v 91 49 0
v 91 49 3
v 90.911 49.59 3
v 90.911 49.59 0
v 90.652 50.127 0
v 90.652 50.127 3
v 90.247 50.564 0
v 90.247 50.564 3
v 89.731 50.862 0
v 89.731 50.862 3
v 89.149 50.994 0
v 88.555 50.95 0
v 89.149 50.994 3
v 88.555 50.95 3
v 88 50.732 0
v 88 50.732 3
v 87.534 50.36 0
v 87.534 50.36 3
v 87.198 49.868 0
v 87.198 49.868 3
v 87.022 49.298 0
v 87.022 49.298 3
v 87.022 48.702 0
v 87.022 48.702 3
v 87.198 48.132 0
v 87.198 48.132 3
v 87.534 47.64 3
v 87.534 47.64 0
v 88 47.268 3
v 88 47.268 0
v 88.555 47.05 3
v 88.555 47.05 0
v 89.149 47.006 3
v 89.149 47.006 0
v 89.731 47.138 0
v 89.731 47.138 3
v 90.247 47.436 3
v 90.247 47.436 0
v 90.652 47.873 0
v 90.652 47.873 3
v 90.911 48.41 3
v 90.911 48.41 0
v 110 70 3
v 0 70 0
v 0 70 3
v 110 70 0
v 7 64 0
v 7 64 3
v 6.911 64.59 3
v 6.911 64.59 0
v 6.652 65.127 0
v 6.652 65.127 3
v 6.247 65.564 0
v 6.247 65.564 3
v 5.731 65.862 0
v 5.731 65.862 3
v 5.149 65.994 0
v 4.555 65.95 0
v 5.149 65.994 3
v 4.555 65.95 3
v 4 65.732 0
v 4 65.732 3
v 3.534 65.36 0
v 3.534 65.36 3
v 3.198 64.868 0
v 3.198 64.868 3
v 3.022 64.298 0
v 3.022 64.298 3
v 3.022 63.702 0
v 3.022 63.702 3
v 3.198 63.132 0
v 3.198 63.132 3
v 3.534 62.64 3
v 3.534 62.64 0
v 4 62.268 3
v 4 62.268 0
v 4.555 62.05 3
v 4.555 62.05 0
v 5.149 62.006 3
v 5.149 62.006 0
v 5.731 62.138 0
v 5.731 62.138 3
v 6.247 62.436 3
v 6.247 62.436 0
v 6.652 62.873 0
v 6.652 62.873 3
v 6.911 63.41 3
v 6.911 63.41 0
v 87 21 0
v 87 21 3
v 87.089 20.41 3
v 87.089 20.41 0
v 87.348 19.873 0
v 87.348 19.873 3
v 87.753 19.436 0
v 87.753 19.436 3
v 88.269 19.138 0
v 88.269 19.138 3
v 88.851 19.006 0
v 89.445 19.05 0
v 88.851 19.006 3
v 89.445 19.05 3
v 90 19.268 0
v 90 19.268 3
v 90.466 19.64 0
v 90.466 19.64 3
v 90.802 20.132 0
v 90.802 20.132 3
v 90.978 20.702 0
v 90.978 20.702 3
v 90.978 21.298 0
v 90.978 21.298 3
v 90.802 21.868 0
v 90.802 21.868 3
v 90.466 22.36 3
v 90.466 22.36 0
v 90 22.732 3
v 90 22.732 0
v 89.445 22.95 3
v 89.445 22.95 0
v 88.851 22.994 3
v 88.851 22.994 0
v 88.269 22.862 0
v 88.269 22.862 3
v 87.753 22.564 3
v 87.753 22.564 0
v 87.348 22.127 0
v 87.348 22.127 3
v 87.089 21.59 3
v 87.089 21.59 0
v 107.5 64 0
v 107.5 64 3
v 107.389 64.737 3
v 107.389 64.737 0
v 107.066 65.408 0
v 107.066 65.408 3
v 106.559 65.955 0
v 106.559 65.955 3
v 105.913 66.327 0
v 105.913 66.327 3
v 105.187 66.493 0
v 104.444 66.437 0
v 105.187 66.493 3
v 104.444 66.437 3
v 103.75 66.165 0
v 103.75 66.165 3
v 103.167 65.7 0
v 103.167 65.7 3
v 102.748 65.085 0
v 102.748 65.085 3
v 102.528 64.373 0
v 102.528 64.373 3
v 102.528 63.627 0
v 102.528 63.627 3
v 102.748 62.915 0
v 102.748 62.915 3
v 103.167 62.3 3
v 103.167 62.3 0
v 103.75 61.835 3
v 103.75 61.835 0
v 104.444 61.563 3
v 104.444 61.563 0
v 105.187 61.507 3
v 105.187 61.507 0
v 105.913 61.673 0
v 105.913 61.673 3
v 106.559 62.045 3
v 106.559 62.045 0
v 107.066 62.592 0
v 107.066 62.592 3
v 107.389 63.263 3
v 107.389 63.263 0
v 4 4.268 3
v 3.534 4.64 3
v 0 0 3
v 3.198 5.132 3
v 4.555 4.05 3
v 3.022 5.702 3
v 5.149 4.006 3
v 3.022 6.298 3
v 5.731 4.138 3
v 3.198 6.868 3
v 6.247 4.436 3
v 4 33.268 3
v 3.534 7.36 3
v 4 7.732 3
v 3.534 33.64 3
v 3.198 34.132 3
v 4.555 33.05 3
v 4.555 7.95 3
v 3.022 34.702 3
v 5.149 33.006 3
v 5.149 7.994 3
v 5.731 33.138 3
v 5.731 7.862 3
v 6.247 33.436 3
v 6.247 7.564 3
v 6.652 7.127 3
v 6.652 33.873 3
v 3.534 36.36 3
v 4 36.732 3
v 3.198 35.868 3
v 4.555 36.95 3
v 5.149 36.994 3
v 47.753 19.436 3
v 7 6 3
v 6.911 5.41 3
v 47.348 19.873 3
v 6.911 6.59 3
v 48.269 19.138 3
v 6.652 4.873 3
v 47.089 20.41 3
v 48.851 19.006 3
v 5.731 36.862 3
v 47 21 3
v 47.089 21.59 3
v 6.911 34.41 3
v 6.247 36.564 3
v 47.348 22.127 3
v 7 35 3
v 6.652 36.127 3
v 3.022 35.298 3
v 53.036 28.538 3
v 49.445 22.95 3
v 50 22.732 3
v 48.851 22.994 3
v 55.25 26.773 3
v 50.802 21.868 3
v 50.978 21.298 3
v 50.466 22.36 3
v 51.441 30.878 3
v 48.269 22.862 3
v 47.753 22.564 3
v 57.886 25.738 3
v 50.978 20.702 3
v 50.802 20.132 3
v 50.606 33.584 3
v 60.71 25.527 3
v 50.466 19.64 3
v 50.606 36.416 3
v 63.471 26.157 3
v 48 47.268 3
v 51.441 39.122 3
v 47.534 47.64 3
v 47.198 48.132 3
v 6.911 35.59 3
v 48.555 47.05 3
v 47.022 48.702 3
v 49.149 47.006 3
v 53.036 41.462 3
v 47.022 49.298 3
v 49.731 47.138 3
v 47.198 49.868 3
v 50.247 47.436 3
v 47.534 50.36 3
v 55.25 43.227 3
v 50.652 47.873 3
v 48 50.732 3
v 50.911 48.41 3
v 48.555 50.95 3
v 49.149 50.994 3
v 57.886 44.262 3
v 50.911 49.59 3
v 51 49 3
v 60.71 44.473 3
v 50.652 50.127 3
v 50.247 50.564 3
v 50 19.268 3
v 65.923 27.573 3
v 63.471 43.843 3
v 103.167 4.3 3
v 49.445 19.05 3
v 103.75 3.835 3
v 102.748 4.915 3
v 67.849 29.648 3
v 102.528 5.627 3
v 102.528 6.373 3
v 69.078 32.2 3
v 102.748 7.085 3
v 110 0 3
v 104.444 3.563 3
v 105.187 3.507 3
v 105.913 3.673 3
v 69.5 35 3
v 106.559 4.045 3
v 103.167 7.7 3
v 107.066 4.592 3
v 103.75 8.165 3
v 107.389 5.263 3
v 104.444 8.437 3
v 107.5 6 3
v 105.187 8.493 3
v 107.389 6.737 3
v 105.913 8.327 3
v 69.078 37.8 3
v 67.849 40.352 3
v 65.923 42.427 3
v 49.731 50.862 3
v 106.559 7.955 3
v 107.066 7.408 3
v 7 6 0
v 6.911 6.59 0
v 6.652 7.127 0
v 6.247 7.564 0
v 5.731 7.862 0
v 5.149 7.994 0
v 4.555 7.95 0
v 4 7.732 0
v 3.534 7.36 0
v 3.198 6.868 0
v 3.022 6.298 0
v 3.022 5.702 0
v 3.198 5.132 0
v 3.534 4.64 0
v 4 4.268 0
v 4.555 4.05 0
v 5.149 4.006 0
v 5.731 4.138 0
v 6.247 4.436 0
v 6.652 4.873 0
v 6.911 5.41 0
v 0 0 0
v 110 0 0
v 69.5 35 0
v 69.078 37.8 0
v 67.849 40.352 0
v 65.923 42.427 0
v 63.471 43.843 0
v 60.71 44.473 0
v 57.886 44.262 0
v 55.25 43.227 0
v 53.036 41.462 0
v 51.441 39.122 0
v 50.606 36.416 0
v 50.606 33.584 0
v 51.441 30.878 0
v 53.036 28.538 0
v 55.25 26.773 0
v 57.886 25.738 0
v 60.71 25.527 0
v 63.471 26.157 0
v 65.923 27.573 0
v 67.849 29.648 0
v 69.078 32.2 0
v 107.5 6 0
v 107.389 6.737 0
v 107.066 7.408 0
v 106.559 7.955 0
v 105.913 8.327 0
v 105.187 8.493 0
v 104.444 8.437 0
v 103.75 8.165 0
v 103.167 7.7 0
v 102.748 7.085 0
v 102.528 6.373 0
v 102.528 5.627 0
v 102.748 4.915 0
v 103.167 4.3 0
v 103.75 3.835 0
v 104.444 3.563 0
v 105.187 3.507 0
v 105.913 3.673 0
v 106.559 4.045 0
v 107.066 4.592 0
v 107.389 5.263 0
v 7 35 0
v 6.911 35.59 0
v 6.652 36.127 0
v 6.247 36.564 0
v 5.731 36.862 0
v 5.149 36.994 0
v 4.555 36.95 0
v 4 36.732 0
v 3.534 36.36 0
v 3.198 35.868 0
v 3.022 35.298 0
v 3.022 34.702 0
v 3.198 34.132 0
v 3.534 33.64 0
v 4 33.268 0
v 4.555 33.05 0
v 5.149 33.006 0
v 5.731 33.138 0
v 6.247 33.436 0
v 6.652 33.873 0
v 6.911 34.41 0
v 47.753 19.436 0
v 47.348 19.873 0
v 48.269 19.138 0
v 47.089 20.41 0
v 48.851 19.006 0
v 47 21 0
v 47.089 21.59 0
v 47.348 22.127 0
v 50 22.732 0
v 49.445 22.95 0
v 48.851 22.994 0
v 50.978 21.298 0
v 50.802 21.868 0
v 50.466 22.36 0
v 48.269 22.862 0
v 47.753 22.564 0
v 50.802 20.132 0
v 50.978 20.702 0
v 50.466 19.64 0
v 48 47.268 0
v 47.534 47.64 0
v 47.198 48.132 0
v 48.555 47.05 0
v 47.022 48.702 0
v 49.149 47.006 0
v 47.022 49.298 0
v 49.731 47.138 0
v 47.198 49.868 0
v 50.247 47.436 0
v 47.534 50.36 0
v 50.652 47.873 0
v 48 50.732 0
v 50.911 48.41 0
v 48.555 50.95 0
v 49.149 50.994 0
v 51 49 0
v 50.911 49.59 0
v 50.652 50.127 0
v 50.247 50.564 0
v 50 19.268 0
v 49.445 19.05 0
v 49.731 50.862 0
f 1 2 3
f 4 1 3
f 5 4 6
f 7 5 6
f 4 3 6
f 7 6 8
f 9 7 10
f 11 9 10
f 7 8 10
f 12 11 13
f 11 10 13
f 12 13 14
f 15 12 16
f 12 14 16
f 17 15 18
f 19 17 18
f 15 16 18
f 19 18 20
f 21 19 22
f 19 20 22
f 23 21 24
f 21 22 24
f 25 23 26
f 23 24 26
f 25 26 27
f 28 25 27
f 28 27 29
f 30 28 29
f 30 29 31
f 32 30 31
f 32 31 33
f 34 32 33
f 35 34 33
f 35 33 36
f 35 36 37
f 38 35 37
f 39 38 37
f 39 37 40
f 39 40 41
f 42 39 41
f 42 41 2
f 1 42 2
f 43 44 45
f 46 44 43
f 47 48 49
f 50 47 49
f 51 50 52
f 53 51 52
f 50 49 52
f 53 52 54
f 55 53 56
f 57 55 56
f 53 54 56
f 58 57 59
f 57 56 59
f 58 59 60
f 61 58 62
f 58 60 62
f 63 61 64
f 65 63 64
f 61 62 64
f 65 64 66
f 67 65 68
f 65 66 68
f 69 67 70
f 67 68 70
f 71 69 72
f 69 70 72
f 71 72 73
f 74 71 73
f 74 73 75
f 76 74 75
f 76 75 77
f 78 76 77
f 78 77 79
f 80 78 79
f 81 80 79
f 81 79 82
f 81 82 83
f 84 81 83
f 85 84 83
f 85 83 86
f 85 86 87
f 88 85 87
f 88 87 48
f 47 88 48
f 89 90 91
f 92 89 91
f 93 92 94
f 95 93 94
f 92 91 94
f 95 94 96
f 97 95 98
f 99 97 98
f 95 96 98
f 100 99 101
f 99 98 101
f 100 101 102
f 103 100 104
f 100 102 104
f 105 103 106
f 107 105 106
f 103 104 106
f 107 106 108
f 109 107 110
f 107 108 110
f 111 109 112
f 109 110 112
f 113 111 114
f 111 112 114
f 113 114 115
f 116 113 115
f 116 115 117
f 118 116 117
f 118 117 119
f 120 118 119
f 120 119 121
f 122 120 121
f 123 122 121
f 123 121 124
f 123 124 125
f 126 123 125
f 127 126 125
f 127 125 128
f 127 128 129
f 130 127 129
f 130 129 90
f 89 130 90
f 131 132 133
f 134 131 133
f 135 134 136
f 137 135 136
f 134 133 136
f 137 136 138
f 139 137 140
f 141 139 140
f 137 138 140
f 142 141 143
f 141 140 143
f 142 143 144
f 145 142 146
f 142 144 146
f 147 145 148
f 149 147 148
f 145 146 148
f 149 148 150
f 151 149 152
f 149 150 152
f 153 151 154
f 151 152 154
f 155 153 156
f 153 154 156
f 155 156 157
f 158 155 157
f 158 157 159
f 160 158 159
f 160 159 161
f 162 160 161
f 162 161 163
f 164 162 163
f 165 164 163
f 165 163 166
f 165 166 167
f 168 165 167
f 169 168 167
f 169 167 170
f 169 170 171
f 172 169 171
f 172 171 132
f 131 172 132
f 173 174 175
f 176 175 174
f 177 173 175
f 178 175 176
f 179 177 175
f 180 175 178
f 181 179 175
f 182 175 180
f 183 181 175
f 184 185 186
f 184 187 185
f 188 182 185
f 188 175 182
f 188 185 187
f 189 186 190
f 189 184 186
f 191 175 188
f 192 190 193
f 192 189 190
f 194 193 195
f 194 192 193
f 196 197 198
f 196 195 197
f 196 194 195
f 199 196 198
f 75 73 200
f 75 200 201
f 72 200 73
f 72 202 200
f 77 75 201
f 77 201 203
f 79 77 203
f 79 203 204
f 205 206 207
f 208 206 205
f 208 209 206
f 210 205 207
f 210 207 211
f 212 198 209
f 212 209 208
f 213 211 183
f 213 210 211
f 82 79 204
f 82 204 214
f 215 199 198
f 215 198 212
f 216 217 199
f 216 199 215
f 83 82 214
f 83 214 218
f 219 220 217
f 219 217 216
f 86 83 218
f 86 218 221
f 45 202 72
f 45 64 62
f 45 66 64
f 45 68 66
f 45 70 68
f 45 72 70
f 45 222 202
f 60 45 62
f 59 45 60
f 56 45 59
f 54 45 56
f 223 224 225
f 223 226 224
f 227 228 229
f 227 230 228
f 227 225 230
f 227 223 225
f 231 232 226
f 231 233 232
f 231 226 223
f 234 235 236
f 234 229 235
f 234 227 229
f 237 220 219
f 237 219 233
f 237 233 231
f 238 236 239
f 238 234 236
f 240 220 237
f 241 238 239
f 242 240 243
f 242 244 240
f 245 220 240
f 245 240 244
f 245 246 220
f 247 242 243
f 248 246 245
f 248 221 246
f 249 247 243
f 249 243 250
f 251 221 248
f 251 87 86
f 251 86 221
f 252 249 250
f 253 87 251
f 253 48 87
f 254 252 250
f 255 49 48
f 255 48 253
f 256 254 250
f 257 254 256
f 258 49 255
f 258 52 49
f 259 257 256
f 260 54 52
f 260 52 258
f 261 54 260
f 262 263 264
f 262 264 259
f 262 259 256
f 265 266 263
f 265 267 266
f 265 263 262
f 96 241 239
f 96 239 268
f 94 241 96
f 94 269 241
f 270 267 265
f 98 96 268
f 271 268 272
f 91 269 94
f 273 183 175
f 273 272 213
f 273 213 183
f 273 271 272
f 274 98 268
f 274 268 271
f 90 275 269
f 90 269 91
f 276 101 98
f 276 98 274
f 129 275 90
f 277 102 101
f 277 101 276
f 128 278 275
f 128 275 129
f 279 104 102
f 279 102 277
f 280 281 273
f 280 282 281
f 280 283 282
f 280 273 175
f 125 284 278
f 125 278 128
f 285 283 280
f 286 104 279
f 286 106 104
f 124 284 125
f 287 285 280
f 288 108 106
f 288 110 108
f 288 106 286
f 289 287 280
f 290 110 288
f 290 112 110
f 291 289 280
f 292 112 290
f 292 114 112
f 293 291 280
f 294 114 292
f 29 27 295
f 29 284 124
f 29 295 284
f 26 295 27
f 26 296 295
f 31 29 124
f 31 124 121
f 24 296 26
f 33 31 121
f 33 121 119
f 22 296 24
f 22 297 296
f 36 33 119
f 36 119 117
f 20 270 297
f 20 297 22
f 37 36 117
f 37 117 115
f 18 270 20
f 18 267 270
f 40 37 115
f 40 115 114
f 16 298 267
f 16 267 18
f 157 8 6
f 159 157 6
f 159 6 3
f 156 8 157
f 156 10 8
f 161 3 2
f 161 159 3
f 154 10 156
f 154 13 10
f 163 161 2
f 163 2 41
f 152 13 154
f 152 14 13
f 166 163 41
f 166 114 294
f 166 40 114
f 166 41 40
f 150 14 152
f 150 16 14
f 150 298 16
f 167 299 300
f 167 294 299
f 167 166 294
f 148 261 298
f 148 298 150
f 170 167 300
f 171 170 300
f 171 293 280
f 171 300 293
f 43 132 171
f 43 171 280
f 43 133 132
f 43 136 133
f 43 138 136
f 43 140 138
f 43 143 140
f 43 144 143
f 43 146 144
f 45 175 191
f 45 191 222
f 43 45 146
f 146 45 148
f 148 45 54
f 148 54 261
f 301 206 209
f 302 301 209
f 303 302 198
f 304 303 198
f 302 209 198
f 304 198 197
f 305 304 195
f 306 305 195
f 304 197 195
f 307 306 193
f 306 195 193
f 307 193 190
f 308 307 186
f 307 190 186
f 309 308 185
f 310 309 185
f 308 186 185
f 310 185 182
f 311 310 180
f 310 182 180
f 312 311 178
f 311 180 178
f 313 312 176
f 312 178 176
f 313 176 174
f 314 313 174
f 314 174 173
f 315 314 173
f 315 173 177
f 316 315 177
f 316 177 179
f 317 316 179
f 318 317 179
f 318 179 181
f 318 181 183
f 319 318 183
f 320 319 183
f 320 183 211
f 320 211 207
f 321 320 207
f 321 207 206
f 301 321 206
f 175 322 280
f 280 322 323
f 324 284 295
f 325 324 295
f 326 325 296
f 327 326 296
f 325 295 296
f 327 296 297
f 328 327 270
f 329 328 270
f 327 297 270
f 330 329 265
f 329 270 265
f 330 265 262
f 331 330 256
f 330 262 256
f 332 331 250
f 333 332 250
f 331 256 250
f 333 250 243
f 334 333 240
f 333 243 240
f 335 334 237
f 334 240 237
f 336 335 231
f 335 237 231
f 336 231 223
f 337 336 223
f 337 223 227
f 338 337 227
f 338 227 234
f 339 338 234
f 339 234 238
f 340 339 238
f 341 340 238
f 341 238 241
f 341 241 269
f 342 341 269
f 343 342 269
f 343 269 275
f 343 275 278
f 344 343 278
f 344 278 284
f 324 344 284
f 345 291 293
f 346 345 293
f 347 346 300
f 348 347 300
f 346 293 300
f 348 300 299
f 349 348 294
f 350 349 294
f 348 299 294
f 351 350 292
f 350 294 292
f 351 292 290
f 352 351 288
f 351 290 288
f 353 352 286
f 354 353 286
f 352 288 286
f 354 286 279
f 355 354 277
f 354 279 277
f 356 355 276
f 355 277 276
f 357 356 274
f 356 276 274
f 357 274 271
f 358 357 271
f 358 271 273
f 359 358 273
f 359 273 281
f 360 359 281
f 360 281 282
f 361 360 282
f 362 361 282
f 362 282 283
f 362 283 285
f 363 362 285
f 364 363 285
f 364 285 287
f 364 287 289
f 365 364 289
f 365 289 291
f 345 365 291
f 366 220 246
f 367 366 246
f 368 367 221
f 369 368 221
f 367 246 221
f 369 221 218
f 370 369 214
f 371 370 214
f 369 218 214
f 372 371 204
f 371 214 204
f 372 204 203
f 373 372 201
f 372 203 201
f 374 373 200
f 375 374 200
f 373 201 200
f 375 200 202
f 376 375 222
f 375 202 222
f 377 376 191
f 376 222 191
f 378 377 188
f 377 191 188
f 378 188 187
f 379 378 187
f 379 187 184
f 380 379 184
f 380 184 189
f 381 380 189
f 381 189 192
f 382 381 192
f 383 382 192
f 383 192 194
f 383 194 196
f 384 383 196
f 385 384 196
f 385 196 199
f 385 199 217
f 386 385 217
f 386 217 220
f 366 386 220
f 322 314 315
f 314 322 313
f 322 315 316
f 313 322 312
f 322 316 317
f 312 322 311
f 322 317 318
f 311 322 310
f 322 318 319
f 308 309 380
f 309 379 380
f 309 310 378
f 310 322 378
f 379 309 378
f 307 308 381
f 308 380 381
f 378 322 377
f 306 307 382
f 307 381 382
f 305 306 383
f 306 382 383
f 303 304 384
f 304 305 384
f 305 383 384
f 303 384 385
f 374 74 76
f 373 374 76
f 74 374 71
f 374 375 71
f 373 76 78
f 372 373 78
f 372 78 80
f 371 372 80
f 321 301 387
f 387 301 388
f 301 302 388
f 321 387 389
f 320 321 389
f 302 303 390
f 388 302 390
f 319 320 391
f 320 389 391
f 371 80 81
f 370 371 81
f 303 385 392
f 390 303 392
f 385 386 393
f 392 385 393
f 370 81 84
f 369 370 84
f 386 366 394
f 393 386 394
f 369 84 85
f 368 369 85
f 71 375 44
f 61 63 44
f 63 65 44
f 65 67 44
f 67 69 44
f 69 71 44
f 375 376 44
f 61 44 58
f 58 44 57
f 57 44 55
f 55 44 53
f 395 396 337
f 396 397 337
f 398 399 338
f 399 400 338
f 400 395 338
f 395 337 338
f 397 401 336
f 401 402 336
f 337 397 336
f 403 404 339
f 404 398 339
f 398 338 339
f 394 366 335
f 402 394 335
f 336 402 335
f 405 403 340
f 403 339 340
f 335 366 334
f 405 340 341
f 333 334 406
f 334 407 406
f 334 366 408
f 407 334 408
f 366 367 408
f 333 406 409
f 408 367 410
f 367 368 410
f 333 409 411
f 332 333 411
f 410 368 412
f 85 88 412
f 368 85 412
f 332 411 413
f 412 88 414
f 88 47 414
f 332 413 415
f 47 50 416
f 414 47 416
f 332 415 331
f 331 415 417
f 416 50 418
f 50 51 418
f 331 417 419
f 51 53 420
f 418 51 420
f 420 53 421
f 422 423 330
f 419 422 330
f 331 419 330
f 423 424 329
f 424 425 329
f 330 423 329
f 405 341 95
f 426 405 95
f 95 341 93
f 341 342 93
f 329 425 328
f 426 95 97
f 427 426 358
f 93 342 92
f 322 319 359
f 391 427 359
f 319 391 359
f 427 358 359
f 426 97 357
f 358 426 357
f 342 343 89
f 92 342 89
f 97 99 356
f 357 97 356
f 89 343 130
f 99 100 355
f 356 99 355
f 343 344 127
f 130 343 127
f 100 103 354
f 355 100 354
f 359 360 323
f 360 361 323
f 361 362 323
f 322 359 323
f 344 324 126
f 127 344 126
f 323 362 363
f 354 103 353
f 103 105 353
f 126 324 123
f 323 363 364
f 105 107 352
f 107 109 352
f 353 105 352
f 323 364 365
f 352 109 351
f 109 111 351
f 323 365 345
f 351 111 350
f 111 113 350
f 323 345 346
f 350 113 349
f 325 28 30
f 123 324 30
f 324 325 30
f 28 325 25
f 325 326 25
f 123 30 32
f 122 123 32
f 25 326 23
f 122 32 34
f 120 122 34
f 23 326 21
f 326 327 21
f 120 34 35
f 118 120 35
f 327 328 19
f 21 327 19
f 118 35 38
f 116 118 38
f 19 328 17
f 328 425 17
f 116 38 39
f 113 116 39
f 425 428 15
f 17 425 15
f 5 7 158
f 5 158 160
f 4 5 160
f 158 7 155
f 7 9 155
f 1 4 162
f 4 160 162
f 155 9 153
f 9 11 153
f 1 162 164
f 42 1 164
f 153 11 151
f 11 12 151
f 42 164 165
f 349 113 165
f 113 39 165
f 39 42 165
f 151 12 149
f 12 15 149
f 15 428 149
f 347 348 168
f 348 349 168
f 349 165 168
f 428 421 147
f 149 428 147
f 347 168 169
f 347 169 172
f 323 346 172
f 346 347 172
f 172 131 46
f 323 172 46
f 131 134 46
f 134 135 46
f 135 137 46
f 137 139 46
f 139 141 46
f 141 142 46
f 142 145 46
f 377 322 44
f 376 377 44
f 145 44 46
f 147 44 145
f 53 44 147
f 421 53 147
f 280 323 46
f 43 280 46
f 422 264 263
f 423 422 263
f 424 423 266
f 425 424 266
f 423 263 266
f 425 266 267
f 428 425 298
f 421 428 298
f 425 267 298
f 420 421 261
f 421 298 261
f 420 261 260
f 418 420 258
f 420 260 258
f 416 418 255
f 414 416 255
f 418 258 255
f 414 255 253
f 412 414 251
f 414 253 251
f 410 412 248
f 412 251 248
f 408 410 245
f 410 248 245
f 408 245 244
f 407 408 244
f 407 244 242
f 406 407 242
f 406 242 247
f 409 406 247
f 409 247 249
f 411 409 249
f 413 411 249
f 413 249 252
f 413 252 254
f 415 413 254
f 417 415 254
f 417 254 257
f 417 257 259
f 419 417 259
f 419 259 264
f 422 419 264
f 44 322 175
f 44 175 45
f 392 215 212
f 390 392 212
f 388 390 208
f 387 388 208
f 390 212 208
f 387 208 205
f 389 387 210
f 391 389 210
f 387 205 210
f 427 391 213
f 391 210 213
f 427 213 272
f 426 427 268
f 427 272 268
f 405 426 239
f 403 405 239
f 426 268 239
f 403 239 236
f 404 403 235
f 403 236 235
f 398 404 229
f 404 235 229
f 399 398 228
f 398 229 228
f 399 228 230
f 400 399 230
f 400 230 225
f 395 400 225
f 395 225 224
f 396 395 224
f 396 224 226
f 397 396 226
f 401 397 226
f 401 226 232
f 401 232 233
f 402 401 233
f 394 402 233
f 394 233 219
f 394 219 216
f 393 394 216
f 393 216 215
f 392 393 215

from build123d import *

# Parameters (mm, degrees)
SKETCH1_W           = 110
SKETCH1_H           = 70
BOSS_EXTRUDE1_DEPTH = 3
SKETCH2_R           = 2
SKETCH2_R_2         = 2.5
CUT_EXTRUDE1_DEPTH  = 5
SKETCH3_R           = 9.5
SKETCH3_R_2         = 2
CUT_EXTRUDE3_DEPTH  = 9


with BuildPart() as part:
    # Sketch1 → Boss-Extrude1 (new body)
    with BuildSketch(Plane.XY):
        with Locations((55, 35)):
            Rectangle(SKETCH1_W, SKETCH1_H)
    extrude(amount=BOSS_EXTRUDE1_DEPTH)

    # Sketch2 → Cut-Extrude1 (cut)
    with BuildSketch(Plane.XY.offset(3)):
        with Locations((5, 64)):
            Circle(SKETCH2_R)
        with Locations((5, 6)):
            Circle(SKETCH2_R)
        with Locations((105, 64)):
            Circle(SKETCH2_R_2)
        with Locations((105, 6)):
            Circle(SKETCH2_R_2)
        with Locations((5, 35)):
            Circle(SKETCH2_R)
    extrude(amount=-CUT_EXTRUDE1_DEPTH, mode=Mode.SUBTRACT)

    # Sketch3 → Cut-Extrude3 (cut)
    with BuildSketch(Plane.XY.offset(3)):
        with Locations((60, 35)):
            Circle(SKETCH3_R)
        with Locations((49, 49)):
            Circle(SKETCH3_R_2)
        with Locations((89, 49)):
            Circle(SKETCH3_R_2)
        with Locations(Location((89, 21, 0), (0, 0, 180))):
            Circle(SKETCH3_R_2)
        with Locations(Location((49, 21, 0), (0, 0, 180))):
            Circle(SKETCH3_R_2)
    extrude(amount=-CUT_EXTRUDE3_DEPTH, mode=Mode.SUBTRACT)


solid = part.part
